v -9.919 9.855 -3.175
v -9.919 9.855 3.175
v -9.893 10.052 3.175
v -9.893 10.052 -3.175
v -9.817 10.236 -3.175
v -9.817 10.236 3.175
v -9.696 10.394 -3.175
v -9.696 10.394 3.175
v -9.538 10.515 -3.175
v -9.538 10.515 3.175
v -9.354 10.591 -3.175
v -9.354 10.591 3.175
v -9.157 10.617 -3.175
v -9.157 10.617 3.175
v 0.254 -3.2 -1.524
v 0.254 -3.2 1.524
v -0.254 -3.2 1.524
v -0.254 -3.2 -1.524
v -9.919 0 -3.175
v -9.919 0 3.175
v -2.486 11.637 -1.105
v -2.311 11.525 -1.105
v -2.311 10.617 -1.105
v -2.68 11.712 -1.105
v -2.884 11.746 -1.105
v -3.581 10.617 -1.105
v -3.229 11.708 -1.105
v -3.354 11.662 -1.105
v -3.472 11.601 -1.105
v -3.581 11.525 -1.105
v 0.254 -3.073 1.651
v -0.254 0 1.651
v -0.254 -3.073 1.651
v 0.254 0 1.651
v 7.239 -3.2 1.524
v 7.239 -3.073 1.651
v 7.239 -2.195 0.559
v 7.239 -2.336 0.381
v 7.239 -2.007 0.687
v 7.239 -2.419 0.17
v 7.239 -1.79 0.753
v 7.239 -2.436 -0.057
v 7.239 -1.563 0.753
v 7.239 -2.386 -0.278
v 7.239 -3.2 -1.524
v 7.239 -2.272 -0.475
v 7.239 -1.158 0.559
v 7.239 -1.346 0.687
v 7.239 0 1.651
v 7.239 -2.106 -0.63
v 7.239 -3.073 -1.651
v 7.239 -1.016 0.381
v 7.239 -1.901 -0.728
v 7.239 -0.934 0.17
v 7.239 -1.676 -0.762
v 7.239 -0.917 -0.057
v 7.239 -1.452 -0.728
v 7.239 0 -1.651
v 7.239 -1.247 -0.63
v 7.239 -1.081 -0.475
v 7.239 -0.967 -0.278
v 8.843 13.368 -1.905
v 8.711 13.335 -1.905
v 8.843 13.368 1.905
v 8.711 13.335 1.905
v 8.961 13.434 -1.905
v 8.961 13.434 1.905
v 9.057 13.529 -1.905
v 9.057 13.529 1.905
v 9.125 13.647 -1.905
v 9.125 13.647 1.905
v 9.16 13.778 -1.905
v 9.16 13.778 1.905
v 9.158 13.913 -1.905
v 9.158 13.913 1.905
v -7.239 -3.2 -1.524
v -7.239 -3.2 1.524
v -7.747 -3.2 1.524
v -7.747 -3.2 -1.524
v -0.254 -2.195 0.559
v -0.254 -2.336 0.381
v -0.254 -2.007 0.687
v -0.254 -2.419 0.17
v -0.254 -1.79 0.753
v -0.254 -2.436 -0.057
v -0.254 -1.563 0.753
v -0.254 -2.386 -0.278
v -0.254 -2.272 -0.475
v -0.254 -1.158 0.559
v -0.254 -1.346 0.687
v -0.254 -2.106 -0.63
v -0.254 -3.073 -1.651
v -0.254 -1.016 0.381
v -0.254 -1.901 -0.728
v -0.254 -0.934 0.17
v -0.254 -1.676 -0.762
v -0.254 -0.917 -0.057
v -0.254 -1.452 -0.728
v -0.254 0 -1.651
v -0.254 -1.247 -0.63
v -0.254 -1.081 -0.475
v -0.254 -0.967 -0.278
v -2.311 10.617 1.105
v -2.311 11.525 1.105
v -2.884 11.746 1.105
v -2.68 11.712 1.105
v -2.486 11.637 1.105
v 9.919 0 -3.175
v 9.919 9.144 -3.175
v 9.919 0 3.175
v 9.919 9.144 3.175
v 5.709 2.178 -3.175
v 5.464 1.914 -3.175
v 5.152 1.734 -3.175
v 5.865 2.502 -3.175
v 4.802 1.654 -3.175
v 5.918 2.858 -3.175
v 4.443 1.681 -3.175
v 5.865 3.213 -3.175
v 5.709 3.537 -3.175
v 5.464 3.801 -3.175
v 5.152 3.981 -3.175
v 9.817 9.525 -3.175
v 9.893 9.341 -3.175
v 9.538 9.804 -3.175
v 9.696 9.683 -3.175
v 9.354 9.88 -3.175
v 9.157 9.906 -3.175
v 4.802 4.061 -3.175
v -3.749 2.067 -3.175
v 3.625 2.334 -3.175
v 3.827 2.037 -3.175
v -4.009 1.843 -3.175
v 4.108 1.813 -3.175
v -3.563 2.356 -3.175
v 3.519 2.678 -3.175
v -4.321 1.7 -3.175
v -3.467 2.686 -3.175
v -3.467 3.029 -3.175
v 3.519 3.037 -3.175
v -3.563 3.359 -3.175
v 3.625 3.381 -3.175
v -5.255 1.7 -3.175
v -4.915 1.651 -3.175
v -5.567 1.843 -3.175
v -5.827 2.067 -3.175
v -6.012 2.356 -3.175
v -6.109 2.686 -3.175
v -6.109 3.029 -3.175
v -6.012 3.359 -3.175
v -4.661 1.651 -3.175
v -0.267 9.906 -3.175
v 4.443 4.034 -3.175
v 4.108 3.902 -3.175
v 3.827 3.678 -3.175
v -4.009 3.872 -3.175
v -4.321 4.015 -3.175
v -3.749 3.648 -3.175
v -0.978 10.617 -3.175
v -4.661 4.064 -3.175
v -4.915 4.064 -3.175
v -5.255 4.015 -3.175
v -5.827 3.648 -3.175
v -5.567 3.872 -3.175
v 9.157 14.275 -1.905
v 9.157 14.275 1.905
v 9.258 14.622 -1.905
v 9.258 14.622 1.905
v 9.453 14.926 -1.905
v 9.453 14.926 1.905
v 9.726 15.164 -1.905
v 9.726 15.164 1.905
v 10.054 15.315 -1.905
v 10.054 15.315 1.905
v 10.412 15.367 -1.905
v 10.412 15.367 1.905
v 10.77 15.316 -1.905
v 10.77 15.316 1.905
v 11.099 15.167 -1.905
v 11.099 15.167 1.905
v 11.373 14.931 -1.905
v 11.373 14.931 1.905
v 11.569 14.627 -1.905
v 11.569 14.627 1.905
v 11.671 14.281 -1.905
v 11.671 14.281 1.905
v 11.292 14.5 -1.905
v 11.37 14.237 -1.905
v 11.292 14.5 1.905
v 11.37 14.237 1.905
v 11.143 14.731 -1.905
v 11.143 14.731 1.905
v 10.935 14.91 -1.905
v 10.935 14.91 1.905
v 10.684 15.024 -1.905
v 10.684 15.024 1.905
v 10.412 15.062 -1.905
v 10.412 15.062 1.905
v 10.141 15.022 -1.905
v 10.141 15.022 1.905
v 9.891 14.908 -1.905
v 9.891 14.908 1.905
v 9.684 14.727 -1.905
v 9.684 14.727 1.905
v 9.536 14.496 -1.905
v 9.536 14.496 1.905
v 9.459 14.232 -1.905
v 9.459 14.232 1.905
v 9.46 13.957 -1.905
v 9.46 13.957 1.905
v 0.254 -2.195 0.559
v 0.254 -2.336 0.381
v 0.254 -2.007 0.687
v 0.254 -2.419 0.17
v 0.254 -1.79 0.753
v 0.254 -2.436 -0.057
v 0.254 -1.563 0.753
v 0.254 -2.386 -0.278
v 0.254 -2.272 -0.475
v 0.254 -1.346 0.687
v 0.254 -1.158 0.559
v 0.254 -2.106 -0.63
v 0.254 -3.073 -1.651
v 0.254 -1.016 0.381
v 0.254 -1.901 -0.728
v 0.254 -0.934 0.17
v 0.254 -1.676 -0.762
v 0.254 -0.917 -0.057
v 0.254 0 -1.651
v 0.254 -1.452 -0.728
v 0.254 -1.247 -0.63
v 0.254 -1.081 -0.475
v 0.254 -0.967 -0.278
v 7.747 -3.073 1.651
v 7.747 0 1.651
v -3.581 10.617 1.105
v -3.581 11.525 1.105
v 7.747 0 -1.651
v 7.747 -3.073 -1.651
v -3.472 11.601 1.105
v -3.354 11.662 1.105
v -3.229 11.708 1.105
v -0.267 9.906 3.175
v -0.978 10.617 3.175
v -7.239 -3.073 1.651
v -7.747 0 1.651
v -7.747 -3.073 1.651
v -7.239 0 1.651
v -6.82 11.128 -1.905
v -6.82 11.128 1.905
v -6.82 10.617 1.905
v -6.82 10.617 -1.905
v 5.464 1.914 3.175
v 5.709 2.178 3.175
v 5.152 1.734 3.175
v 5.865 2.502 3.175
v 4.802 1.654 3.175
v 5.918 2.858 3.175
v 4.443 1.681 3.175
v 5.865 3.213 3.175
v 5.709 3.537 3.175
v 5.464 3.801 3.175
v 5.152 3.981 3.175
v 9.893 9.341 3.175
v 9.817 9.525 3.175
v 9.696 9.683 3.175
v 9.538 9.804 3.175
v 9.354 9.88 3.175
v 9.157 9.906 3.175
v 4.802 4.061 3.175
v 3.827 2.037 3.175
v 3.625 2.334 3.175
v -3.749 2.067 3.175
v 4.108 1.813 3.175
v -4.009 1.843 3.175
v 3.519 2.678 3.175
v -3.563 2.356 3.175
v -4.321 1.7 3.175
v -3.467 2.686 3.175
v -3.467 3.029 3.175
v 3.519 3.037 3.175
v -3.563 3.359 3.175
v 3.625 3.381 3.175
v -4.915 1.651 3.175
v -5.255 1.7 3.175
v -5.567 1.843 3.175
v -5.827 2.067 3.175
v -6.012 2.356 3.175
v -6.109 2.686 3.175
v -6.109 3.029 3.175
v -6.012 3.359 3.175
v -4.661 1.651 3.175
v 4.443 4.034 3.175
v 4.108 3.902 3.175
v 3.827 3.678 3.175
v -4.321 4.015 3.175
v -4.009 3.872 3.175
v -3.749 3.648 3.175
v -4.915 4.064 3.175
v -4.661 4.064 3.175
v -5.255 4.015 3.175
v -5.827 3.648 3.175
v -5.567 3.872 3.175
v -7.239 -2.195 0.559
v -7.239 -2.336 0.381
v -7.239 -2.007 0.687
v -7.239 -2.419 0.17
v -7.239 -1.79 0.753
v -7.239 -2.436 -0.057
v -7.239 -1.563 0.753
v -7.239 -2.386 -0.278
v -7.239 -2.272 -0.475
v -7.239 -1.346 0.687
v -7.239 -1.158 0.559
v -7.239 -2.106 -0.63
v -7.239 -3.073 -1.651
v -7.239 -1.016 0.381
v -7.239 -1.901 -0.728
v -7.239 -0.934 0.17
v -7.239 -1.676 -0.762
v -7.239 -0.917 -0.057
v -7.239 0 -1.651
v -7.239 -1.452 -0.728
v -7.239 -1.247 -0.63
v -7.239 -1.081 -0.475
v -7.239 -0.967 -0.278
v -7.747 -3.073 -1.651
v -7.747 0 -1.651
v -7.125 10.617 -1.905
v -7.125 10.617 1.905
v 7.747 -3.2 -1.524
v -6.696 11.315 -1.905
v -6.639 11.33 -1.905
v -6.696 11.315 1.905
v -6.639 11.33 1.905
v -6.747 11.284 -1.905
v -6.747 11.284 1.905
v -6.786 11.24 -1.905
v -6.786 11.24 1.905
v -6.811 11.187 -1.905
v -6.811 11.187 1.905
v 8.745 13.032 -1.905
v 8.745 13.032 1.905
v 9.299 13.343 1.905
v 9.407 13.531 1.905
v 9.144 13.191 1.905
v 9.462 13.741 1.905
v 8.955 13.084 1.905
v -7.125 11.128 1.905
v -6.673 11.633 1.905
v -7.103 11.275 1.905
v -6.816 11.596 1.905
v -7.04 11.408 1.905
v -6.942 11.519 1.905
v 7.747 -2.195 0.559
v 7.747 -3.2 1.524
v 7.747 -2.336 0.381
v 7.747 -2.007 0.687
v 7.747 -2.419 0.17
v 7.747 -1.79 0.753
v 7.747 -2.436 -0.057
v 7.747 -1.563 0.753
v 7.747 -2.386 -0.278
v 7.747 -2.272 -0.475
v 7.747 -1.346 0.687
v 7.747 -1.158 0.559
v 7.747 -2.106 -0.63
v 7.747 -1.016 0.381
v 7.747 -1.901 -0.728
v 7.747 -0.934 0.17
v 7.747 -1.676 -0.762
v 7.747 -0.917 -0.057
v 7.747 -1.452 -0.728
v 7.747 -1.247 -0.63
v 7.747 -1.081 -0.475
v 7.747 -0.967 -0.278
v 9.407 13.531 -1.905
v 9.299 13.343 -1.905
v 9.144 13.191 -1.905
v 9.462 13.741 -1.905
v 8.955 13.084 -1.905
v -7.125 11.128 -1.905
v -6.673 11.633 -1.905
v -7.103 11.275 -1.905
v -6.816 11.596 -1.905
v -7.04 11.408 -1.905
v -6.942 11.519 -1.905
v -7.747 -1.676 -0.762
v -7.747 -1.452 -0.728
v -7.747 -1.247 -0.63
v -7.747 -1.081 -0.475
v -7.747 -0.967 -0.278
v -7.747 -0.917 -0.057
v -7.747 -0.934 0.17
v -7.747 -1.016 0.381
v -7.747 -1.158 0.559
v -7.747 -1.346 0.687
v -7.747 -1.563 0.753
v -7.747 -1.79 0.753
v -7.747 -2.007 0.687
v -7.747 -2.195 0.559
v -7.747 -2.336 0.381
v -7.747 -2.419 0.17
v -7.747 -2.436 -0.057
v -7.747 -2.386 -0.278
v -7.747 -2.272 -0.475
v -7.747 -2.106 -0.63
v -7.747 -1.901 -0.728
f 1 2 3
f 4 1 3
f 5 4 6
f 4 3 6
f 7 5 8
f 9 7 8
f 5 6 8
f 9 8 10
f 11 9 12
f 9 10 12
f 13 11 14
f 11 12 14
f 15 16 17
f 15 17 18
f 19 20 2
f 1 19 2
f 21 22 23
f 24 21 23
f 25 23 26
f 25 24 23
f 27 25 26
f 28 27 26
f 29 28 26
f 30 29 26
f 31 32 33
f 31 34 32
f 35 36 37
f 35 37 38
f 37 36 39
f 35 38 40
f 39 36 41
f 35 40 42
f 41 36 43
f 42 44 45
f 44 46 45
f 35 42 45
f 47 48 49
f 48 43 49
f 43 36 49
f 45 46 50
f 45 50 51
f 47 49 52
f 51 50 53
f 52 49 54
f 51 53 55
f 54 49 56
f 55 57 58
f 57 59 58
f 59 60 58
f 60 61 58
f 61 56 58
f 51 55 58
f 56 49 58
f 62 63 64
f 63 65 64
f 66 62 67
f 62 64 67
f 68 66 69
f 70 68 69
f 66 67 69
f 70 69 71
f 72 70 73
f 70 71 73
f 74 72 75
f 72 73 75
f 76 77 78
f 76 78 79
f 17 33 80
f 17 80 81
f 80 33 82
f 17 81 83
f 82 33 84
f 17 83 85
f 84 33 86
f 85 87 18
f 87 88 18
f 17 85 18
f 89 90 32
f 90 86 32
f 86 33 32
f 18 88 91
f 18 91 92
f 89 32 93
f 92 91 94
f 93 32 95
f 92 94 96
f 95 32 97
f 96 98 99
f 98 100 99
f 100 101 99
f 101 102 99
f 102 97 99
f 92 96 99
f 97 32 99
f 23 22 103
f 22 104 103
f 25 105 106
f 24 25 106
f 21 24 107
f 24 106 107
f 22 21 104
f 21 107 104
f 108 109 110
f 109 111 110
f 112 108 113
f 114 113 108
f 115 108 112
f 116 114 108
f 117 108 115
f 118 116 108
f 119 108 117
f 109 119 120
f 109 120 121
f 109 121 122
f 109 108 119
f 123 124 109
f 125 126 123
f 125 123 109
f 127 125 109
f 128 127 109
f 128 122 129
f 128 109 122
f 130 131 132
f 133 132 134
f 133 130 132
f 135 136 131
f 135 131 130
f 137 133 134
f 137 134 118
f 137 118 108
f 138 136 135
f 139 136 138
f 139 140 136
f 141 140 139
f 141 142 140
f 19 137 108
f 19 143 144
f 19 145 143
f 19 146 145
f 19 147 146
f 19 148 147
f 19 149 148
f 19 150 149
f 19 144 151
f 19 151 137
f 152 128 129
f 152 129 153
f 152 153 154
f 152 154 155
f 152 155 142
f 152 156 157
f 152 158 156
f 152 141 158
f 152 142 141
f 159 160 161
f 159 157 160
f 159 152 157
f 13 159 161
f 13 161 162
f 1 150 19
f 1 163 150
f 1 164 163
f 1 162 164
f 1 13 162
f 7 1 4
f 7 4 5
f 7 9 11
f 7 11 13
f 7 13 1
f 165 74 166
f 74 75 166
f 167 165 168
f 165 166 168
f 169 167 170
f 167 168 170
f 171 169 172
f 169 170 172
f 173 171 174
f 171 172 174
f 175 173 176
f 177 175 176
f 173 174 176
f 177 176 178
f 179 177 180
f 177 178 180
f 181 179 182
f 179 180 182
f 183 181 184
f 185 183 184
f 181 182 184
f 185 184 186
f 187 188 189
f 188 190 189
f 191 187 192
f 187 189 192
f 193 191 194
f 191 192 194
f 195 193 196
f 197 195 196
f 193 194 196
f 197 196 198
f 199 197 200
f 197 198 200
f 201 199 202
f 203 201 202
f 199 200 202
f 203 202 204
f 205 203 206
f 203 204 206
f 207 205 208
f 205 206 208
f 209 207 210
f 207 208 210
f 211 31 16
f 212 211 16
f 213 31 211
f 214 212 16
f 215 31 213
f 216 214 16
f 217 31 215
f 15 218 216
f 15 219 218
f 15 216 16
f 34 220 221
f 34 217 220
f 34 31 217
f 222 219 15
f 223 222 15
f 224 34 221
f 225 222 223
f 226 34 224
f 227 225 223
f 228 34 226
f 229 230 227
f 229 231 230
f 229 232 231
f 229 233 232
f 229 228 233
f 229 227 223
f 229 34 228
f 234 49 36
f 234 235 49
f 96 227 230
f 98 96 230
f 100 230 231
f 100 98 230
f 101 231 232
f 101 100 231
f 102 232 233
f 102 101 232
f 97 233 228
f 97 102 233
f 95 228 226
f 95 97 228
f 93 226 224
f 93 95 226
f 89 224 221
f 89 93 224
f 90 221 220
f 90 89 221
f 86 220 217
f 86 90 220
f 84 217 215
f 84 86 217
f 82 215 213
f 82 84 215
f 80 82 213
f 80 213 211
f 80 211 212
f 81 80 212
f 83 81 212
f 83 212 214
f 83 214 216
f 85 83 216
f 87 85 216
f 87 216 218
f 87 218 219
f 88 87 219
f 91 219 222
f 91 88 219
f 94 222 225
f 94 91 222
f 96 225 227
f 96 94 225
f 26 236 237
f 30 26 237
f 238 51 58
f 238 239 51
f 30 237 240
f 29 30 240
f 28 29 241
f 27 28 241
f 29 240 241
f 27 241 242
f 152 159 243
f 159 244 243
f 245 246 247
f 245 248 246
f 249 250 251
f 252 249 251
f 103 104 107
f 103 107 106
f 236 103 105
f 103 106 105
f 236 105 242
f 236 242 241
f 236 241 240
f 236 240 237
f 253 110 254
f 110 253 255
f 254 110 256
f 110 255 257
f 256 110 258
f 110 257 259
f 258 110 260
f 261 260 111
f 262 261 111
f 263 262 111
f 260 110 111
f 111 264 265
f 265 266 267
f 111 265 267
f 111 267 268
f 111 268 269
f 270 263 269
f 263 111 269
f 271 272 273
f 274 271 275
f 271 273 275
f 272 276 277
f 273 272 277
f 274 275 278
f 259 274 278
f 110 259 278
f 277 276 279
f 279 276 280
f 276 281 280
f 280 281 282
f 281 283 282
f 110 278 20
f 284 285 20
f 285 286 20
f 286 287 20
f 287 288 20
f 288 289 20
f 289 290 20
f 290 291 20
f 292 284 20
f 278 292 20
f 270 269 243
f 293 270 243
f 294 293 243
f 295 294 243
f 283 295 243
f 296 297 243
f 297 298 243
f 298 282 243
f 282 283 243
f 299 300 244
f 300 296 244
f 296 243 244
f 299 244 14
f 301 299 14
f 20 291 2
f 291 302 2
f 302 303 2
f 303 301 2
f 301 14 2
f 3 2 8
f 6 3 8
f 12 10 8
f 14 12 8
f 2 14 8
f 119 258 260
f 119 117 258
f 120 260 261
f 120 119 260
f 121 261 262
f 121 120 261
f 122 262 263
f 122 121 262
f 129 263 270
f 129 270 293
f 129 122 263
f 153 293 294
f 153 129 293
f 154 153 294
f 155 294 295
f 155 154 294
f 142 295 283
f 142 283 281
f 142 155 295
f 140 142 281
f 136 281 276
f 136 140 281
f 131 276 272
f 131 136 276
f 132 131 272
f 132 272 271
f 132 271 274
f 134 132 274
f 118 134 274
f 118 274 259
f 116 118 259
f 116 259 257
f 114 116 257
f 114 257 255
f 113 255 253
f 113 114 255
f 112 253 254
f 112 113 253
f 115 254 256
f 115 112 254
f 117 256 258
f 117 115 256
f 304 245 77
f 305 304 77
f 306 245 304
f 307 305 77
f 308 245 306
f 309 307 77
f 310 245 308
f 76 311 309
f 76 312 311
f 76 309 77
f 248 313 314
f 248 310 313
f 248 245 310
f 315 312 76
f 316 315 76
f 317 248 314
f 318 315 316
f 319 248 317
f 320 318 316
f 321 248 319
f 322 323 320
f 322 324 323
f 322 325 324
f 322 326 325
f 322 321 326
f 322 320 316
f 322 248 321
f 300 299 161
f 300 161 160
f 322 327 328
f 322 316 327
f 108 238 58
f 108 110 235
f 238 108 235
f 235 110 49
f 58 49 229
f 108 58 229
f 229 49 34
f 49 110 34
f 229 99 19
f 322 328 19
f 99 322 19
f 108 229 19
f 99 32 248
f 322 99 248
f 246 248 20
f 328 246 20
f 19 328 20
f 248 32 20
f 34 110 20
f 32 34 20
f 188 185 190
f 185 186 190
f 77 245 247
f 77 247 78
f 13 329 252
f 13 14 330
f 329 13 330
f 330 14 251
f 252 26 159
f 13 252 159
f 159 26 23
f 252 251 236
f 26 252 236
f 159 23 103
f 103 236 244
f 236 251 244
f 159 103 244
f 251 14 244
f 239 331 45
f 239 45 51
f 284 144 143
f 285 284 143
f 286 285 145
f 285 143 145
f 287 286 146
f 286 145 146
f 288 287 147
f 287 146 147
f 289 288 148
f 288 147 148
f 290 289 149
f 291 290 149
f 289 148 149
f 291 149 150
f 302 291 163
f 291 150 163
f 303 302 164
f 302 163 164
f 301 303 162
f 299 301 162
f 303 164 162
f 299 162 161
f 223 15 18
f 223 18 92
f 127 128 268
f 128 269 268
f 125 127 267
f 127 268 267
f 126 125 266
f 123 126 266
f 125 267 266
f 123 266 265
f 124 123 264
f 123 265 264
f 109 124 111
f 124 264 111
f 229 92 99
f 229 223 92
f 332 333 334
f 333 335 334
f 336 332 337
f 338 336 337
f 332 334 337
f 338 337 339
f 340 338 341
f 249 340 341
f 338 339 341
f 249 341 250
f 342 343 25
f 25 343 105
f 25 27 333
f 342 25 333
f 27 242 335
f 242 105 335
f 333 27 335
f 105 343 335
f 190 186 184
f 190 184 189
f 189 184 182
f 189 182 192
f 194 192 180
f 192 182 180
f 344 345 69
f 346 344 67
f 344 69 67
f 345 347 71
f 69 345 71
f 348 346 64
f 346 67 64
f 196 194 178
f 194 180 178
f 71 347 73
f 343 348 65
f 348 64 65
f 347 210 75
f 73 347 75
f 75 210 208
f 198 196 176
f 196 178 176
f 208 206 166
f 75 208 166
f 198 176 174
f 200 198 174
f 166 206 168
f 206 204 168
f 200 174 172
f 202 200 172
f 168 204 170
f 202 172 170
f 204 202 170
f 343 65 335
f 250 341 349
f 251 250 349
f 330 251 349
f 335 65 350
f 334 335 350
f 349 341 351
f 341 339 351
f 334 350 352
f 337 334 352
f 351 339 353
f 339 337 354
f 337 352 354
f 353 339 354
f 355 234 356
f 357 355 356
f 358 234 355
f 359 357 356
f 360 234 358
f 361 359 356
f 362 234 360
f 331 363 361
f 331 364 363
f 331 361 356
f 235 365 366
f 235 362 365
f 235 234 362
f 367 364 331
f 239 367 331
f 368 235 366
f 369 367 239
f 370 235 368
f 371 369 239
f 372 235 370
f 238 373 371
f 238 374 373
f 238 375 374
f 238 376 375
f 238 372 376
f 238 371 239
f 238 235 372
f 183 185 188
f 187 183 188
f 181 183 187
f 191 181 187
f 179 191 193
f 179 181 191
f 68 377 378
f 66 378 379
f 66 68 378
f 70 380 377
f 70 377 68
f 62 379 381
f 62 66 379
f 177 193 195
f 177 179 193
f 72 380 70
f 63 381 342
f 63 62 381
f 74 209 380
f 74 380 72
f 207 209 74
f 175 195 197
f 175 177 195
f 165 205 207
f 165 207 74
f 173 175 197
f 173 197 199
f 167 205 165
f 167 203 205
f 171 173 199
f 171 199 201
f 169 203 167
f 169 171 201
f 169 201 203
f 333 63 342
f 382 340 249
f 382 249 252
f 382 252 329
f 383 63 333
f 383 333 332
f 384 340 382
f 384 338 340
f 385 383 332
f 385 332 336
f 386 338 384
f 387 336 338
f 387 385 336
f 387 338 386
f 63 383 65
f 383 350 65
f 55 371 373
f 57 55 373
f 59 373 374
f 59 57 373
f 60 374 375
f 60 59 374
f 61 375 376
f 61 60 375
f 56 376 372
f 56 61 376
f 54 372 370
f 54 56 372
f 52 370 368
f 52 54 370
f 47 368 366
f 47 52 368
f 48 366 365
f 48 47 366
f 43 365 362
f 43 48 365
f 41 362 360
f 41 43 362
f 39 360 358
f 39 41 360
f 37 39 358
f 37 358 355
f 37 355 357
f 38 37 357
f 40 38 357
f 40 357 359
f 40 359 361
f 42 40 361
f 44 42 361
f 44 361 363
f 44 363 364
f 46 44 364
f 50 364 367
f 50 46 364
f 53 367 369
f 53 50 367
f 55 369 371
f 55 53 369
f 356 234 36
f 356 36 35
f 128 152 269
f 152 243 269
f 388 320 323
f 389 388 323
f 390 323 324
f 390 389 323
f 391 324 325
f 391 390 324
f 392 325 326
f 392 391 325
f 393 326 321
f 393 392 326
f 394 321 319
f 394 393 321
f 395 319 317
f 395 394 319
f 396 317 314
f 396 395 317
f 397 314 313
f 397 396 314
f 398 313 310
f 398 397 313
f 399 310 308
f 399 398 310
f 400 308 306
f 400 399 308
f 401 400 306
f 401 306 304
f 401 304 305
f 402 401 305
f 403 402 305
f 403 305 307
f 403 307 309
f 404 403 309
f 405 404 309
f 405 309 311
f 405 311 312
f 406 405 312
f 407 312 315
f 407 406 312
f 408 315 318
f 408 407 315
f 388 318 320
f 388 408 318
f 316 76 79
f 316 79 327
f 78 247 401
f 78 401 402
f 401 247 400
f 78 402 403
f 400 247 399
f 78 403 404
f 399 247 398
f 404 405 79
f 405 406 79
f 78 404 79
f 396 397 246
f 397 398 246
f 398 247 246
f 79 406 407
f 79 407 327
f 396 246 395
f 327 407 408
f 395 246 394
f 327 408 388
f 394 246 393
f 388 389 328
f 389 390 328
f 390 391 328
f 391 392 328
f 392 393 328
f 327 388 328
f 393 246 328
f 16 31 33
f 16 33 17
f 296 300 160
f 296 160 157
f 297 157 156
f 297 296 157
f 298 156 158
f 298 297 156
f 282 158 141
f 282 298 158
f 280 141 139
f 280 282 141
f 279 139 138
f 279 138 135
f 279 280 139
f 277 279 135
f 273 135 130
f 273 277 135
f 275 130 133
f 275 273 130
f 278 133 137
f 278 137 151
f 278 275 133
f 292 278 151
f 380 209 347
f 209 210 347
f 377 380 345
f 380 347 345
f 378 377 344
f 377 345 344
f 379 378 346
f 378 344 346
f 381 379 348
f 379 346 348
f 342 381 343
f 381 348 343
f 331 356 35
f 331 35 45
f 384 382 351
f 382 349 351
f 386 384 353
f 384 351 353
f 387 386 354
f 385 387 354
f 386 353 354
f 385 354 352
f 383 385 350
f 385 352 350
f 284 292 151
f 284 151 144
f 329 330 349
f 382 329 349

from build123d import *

# Parameters (mm, degrees)
SKETCH2_R           = 1.2065
EXTRUDE1_DEPTH      = 3.175
EXTRUDE2_DEPTH      = 1.1049
SKETCH10_R          = 0.762
EXTRUDE6_DEPTH      = 0.254
LPATTERN1_COUNT     = 3
LPATTERN1_PITCH     = 7.493
EXTRUDE_THIN1_DEPTH = 1.905


with BuildPart() as part:
    # Sketch2 → Extrude1 (new body, symmetric)
    with BuildSketch(Plane.XY):
        with BuildLine():
            Line((-9.1567, 10.6172), (-4.9149, 10.6172))
            Line((-4.9149, 10.6172), (-0.9779, 10.6172))
            Line((-0.9779, 10.6172), (-0.2667, 9.906))
            Line((-0.2667, 9.906), (9.1567, 9.906))
            ThreePointArc((9.1567, 9.906), (9.695515367, 9.682815367), (9.9187, 9.144))
            Line((9.9187, 9.144), (9.9187, 0))
            Line((9.9187, 0), (-9.9187, 0))
            Line((-9.9187, 0), (-9.9187, 9.8552))
            ThreePointArc((-9.9187, 9.8552), (-9.695515367, 10.394015367), (-9.1567, 10.6172))
        make_face()
        with Locations((4.7117, 2.8575)):
            Circle(SKETCH2_R, mode=Mode.SUBTRACT)
        with BuildLine():
            Line((-4.9149, 4.064), (-4.6609, 4.064))
            ThreePointArc((-4.6609, 4.064), (-3.4544, 2.8575), (-4.6609, 1.651))
            Line((-4.6609, 1.651), (-4.9149, 1.651))
            ThreePointArc((-4.9149, 1.651), (-6.1214, 2.8575), (-4.9149, 4.064))
        make_face(mode=Mode.SUBTRACT)
    extrude(amount=EXTRUDE1_DEPTH, both=True)

    # Sketch10 → Extrude6 (add, symmetric)
    with BuildSketch(Plane(origin=(-7.493, 0, 0), x_dir=(0, 0, -1), z_dir=(1, 0, 0))):
        Polygon((-1.651, 0), (-1.651, -3.0734), (-1.524, -3.2004), (1.524, -3.2004), (1.651, -3.0734), (1.651, 0), align=None)
        with Locations((0, -1.6764)):
            Circle(SKETCH10_R, mode=Mode.SUBTRACT)
    extrude6 = extrude(amount=EXTRUDE6_DEPTH, both=True)

    # LPattern1: Extrude6 ×3
    with Locations(*[(i * LPATTERN1_PITCH, 0, 0) for i in range(1, LPATTERN1_COUNT)]):
        add(extrude6)



with BuildPart() as body_2:
    # Sketch3 → Extrude2 (new body, symmetric)
    with BuildSketch(Plane.XY):
        with BuildLine():
            Line((-3.5814, 10.6172), (-3.5814, 11.524614746))
            ThreePointArc((-3.5814, 11.524614746), (-2.9464, 11.7475), (-2.3114, 11.524614746))
            Line((-2.3114, 11.524614746), (-2.3114, 10.6172))
            Line((-2.3114, 10.6172), (-3.5814, 10.6172))
        make_face()
    extrude(amount=EXTRUDE2_DEPTH, both=True)


with BuildPart() as part_1:
    add(part.part)

    add(body_2.part)  # Extrude-Thin1 merges body 2
    # Sketch11 → Extrude-Thin1 (add, symmetric)
    with BuildSketch(Plane.XY):
        with BuildLine():
            Line((-7.1247, 10.6172), (-7.1247, 11.128280087))
            ThreePointArc((-7.1247, 11.128280087), (-6.995143389, 11.467167386), (-6.672555901, 11.6332))
            Line((-6.672555901, 11.6332), (8.711185108, 13.335))
            ThreePointArc((8.711185108, 13.335), (9.057341476, 13.529355692), (9.157991006, 13.913371366))
            ThreePointArc((9.157991006, 13.913371366), (10.231016869, 15.353654497), (11.6713, 14.280628634))
            Line((11.6713, 14.280628634), (11.369702921, 14.236557762))
            ThreePointArc((11.369702921, 14.236557762), (10.275087741, 15.052057418), (9.459588085, 13.957442238))
            ThreePointArc((9.459588085, 13.957442238), (9.298548838, 13.343017159), (8.744698648, 13.032048052))
            Line((8.744698648, 13.032048052), (-6.63904236, 11.330248052))
            ThreePointArc((-6.63904236, 11.330248052), (-6.768077356, 11.263835007), (-6.8199, 11.128280087))
            Line((-6.8199, 11.128280087), (-6.8199, 10.6172))
            Line((-6.8199, 10.6172), (-7.1247, 10.6172))
        make_face()
    extrude(amount=EXTRUDE_THIN1_DEPTH, both=True)


solid = part_1.part
